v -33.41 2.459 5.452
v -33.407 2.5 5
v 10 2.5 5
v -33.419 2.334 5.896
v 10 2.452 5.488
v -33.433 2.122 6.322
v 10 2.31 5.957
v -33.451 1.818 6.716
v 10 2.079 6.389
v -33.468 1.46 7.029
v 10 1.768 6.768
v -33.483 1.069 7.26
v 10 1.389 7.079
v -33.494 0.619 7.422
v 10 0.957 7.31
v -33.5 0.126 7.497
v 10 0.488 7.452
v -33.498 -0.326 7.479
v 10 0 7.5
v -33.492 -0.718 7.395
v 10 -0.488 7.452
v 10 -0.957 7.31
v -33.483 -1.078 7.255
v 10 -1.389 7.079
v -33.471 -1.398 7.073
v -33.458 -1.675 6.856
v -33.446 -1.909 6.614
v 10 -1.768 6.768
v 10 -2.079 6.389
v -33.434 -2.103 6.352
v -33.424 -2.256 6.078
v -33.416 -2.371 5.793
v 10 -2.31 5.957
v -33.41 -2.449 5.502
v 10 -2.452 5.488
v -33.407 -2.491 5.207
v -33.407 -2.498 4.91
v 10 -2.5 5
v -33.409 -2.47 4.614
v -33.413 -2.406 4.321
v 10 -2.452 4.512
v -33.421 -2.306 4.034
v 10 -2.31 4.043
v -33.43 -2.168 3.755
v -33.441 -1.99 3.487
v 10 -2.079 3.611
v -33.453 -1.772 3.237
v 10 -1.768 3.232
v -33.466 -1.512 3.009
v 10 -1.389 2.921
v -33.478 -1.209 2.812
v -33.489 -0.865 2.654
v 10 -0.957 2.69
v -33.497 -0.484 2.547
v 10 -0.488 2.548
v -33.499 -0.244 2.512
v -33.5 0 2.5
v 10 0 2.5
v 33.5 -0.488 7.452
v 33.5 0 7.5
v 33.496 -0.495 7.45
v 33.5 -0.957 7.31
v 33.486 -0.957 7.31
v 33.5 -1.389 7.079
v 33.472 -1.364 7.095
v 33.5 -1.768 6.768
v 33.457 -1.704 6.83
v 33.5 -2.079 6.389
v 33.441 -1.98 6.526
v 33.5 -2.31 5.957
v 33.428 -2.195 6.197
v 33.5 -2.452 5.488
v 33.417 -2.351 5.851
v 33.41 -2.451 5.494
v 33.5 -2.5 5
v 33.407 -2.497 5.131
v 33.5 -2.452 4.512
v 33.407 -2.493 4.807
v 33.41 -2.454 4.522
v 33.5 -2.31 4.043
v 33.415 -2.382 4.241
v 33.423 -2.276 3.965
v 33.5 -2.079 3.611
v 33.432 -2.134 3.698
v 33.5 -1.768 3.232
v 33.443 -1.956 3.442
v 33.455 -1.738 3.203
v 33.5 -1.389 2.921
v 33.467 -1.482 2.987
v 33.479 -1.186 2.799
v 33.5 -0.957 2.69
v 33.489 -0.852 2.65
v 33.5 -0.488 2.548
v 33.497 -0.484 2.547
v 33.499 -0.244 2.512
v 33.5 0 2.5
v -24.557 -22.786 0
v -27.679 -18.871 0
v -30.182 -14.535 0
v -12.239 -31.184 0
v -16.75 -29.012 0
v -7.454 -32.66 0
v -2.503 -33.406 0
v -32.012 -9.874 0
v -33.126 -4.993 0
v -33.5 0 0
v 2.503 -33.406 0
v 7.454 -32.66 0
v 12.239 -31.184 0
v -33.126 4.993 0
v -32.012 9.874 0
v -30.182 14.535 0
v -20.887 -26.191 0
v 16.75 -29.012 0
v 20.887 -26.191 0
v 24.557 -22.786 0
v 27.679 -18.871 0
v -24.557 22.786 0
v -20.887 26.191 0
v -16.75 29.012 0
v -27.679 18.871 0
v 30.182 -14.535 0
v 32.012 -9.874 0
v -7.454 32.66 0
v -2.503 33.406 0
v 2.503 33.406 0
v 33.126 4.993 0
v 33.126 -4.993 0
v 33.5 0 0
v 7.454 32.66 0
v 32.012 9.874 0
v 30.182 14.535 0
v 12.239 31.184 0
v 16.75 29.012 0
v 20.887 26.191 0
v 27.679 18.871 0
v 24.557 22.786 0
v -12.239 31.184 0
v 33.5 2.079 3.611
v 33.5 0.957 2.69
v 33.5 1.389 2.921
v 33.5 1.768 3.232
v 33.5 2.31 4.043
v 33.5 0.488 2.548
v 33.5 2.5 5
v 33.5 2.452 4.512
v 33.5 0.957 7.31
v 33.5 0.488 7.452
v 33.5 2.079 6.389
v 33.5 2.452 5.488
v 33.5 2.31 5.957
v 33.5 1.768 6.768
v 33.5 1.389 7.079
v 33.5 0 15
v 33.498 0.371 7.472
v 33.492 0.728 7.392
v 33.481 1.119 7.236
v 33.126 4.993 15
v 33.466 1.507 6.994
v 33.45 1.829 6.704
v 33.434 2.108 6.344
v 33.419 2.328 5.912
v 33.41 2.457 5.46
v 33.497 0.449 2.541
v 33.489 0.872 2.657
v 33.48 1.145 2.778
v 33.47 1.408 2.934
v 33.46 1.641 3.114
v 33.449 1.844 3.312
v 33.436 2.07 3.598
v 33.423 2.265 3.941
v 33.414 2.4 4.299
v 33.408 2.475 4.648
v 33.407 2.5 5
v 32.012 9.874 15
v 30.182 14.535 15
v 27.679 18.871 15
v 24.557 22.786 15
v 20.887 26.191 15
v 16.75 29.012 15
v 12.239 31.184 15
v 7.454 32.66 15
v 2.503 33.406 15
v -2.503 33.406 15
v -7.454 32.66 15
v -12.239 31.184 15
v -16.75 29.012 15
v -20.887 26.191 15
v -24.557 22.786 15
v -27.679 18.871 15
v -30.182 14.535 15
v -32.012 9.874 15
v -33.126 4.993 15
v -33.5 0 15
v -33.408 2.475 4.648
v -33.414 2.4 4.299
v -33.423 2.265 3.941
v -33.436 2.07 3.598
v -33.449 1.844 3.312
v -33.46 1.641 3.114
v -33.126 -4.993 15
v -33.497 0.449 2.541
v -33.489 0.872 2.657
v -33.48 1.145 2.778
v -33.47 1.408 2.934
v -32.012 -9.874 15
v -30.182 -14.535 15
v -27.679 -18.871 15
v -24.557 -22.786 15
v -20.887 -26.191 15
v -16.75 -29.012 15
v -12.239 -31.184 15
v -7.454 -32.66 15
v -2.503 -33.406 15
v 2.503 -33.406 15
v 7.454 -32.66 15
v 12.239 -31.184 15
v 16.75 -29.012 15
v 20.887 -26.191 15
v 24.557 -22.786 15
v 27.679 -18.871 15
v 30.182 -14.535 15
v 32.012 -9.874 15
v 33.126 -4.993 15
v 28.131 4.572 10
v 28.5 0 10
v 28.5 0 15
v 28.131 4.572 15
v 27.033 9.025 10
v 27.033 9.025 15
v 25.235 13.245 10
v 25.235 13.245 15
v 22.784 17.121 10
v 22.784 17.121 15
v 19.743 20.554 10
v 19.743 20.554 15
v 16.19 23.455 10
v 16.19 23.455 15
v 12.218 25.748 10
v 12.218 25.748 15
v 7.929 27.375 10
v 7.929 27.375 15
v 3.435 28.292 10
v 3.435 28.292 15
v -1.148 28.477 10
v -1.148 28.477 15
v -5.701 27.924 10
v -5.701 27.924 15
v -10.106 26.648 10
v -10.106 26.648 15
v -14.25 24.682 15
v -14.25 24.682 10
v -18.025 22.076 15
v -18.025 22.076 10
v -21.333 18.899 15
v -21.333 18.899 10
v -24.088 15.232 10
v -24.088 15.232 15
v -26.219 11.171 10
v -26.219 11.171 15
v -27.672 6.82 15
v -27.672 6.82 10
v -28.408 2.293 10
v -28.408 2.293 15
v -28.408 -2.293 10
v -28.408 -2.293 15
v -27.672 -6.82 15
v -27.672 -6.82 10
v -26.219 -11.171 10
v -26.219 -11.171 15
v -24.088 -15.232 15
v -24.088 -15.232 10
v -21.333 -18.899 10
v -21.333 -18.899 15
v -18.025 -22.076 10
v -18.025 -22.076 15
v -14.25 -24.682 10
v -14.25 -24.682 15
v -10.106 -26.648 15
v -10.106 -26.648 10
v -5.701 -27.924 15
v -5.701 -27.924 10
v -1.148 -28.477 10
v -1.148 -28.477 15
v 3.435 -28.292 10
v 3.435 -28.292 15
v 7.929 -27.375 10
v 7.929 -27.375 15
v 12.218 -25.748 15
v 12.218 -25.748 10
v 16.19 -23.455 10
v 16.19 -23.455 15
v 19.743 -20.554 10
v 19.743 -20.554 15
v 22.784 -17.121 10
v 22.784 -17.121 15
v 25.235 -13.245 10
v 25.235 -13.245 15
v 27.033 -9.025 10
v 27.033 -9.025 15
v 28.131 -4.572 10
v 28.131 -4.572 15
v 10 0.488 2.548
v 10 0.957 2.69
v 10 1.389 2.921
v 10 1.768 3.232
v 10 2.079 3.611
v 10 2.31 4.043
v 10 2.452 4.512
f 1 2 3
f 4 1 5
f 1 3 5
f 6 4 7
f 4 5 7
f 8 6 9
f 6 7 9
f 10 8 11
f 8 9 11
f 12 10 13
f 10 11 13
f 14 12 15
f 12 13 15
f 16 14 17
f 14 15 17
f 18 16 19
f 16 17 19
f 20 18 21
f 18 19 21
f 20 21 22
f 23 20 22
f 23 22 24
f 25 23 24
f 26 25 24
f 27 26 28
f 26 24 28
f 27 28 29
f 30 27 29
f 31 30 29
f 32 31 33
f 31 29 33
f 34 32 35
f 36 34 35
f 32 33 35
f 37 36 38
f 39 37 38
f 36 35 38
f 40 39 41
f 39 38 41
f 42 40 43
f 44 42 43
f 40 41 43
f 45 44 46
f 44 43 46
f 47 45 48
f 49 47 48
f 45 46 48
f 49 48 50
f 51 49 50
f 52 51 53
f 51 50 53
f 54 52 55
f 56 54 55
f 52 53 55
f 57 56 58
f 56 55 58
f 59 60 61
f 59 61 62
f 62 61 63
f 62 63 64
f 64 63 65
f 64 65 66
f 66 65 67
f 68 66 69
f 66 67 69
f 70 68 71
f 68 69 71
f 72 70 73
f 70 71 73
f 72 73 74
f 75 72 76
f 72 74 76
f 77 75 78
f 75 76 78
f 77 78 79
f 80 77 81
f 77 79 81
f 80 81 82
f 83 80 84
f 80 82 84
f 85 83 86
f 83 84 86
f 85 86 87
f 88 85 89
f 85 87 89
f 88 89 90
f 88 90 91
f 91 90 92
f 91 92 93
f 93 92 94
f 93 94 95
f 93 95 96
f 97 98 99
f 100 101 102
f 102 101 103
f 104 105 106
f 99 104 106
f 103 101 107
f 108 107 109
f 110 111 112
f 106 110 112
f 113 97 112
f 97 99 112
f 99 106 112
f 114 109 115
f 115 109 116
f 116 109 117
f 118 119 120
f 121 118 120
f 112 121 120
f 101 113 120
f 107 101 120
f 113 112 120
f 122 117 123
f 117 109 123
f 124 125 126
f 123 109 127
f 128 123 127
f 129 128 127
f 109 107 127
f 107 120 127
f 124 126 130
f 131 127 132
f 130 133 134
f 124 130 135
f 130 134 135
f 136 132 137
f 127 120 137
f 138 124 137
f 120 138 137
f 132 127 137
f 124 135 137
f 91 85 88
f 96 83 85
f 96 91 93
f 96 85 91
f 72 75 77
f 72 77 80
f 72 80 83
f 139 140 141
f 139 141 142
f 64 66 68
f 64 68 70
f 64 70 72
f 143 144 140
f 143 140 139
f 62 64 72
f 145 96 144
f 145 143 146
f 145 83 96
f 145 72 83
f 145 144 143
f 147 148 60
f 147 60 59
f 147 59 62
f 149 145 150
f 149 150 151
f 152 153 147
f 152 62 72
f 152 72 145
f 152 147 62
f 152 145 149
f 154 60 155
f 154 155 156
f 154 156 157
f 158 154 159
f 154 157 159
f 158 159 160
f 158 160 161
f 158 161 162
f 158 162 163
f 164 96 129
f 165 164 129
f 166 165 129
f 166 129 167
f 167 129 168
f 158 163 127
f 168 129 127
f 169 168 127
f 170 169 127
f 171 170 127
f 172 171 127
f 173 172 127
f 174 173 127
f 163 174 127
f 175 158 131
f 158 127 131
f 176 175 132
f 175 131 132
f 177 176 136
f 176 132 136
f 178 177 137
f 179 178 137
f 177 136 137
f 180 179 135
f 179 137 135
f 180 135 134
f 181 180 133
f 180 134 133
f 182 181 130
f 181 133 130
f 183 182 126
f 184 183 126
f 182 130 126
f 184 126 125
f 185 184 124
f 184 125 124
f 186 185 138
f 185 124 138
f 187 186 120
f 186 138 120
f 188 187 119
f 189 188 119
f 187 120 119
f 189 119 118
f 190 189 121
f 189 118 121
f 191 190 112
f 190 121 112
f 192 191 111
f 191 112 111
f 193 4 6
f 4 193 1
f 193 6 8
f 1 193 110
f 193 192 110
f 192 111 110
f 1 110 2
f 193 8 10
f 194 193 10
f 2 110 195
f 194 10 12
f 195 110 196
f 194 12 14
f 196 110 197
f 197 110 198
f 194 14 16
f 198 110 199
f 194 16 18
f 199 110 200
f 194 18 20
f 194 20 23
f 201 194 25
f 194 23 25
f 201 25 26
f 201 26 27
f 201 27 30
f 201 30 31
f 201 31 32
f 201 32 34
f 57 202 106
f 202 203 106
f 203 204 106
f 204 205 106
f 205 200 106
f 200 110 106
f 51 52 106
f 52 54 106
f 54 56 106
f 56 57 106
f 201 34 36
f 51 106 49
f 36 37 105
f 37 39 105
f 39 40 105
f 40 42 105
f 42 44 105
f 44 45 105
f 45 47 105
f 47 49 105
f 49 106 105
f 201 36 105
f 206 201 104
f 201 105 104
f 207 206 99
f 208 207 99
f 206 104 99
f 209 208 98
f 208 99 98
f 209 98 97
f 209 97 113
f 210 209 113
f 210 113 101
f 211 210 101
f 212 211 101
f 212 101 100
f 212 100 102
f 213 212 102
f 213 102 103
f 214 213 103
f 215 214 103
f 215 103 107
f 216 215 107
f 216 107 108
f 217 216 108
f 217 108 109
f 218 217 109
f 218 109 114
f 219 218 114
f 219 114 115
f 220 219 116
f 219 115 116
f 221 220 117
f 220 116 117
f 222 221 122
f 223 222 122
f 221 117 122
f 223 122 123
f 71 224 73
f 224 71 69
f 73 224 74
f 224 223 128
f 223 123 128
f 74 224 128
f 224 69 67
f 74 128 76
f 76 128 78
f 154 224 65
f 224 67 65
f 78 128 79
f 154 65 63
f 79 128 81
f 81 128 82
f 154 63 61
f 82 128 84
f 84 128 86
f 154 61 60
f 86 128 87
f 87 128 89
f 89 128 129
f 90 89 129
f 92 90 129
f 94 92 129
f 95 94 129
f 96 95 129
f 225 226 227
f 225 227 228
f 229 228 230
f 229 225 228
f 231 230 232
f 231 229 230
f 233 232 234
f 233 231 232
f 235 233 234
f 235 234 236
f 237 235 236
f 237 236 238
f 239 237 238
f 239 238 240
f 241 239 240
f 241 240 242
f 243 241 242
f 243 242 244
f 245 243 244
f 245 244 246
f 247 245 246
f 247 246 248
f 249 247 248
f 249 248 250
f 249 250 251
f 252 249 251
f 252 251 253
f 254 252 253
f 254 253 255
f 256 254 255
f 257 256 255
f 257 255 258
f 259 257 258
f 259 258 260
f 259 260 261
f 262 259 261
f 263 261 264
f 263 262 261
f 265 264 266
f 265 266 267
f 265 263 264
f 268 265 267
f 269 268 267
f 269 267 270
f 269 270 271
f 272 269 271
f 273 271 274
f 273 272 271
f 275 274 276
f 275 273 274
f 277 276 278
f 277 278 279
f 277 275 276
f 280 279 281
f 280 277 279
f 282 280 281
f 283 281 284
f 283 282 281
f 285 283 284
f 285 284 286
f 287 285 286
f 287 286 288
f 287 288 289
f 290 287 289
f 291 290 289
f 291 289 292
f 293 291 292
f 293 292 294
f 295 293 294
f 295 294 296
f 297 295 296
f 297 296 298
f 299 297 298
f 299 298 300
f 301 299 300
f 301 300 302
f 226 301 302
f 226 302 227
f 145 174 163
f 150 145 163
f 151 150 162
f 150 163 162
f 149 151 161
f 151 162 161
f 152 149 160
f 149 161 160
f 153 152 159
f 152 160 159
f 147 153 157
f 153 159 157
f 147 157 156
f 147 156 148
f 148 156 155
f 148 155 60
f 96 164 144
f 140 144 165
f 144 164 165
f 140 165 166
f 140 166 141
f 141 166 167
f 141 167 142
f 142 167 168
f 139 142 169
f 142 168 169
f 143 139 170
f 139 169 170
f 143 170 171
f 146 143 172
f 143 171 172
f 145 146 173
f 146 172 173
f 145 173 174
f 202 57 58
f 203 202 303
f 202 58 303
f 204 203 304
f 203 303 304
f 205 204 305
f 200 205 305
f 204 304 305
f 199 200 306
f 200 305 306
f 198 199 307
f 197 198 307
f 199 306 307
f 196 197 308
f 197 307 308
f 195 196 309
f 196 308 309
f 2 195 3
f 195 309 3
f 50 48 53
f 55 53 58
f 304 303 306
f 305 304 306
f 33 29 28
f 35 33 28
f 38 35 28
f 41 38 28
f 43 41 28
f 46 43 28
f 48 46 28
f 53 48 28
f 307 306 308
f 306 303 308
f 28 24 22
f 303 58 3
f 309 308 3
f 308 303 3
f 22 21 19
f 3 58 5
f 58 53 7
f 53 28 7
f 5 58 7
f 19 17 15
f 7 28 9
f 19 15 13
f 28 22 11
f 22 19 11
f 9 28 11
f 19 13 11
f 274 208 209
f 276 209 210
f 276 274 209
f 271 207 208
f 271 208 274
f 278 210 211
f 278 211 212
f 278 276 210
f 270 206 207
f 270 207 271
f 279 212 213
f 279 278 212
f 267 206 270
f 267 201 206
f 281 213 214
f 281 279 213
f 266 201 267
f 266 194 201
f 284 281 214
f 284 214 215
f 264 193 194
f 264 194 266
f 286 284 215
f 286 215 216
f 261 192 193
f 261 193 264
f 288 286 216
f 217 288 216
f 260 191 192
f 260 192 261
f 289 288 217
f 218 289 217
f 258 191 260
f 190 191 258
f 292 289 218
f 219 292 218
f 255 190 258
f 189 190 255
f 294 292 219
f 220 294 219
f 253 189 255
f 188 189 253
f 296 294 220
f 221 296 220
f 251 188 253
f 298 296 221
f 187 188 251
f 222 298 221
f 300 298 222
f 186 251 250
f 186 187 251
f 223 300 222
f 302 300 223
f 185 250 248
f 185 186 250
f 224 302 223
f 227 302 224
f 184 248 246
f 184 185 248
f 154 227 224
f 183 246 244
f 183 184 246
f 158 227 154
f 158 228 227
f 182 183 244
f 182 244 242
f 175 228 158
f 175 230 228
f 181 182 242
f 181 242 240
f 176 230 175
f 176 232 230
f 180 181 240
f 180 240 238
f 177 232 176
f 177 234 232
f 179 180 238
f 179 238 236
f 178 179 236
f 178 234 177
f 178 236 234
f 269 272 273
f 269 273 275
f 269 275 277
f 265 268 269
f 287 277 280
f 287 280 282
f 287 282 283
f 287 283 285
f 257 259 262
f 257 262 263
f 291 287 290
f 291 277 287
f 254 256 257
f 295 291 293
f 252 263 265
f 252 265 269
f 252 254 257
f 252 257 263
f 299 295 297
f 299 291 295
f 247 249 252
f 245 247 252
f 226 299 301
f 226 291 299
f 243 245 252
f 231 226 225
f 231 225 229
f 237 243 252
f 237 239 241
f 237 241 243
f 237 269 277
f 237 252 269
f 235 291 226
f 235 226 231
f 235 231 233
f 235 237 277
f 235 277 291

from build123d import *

# Parameters (mm, degrees)
F0_R     = 33.5
F0_R_2   = 28.5
F1_DEPTH = 15
F2_DEPTH = 10
F4_DEPTH = 35
F5_DEPTH = 33.5
F6_DEPTH = 10


with BuildPart() as f1:
    # F0 (on Top) → F1 (new body)
    with BuildSketch(Plane.XY):
        Circle(F0_R)
        Circle(F0_R_2, mode=Mode.SUBTRACT)
    extrude(amount=F1_DEPTH)

    # F0 (on Top) → F2 (join)
    with BuildSketch(Plane.XY):
        Circle(F0_R_2)
    extrude(amount=F2_DEPTH)

    # F3 (on Right) → F4 (cut, symmetric)
    with BuildSketch(Plane.YZ):
        with BuildLine():
            ThreePointArc((0, 2.5), (1.767767, 3.232233), (2.5, 5))
            ThreePointArc((2.5, 5), (-1.767767, 6.767767), (0, 2.5))
        make_face()
    extrude(amount=F4_DEPTH, both=True, mode=Mode.SUBTRACT)

    # F3 (on Right) → F5 (join)
    with BuildSketch(Plane.YZ):
        with BuildLine():
            ThreePointArc((0, 2.5), (1.767767, 3.232233), (2.5, 5))
            ThreePointArc((2.5, 5), (-1.767767, 6.767767), (0, 2.5))
        make_face()
    extrude(amount=F5_DEPTH)

    # F3 (on Right) → F6 (cut)
    with BuildSketch(Plane.YZ):
        with BuildLine():
            ThreePointArc((0, 2.5), (1.767767, 3.232233), (2.5, 5))
            ThreePointArc((2.5, 5), (-1.767767, 6.767767), (0, 2.5))
        make_face()
    extrude(amount=F6_DEPTH, mode=Mode.SUBTRACT)


solid = f1.part
